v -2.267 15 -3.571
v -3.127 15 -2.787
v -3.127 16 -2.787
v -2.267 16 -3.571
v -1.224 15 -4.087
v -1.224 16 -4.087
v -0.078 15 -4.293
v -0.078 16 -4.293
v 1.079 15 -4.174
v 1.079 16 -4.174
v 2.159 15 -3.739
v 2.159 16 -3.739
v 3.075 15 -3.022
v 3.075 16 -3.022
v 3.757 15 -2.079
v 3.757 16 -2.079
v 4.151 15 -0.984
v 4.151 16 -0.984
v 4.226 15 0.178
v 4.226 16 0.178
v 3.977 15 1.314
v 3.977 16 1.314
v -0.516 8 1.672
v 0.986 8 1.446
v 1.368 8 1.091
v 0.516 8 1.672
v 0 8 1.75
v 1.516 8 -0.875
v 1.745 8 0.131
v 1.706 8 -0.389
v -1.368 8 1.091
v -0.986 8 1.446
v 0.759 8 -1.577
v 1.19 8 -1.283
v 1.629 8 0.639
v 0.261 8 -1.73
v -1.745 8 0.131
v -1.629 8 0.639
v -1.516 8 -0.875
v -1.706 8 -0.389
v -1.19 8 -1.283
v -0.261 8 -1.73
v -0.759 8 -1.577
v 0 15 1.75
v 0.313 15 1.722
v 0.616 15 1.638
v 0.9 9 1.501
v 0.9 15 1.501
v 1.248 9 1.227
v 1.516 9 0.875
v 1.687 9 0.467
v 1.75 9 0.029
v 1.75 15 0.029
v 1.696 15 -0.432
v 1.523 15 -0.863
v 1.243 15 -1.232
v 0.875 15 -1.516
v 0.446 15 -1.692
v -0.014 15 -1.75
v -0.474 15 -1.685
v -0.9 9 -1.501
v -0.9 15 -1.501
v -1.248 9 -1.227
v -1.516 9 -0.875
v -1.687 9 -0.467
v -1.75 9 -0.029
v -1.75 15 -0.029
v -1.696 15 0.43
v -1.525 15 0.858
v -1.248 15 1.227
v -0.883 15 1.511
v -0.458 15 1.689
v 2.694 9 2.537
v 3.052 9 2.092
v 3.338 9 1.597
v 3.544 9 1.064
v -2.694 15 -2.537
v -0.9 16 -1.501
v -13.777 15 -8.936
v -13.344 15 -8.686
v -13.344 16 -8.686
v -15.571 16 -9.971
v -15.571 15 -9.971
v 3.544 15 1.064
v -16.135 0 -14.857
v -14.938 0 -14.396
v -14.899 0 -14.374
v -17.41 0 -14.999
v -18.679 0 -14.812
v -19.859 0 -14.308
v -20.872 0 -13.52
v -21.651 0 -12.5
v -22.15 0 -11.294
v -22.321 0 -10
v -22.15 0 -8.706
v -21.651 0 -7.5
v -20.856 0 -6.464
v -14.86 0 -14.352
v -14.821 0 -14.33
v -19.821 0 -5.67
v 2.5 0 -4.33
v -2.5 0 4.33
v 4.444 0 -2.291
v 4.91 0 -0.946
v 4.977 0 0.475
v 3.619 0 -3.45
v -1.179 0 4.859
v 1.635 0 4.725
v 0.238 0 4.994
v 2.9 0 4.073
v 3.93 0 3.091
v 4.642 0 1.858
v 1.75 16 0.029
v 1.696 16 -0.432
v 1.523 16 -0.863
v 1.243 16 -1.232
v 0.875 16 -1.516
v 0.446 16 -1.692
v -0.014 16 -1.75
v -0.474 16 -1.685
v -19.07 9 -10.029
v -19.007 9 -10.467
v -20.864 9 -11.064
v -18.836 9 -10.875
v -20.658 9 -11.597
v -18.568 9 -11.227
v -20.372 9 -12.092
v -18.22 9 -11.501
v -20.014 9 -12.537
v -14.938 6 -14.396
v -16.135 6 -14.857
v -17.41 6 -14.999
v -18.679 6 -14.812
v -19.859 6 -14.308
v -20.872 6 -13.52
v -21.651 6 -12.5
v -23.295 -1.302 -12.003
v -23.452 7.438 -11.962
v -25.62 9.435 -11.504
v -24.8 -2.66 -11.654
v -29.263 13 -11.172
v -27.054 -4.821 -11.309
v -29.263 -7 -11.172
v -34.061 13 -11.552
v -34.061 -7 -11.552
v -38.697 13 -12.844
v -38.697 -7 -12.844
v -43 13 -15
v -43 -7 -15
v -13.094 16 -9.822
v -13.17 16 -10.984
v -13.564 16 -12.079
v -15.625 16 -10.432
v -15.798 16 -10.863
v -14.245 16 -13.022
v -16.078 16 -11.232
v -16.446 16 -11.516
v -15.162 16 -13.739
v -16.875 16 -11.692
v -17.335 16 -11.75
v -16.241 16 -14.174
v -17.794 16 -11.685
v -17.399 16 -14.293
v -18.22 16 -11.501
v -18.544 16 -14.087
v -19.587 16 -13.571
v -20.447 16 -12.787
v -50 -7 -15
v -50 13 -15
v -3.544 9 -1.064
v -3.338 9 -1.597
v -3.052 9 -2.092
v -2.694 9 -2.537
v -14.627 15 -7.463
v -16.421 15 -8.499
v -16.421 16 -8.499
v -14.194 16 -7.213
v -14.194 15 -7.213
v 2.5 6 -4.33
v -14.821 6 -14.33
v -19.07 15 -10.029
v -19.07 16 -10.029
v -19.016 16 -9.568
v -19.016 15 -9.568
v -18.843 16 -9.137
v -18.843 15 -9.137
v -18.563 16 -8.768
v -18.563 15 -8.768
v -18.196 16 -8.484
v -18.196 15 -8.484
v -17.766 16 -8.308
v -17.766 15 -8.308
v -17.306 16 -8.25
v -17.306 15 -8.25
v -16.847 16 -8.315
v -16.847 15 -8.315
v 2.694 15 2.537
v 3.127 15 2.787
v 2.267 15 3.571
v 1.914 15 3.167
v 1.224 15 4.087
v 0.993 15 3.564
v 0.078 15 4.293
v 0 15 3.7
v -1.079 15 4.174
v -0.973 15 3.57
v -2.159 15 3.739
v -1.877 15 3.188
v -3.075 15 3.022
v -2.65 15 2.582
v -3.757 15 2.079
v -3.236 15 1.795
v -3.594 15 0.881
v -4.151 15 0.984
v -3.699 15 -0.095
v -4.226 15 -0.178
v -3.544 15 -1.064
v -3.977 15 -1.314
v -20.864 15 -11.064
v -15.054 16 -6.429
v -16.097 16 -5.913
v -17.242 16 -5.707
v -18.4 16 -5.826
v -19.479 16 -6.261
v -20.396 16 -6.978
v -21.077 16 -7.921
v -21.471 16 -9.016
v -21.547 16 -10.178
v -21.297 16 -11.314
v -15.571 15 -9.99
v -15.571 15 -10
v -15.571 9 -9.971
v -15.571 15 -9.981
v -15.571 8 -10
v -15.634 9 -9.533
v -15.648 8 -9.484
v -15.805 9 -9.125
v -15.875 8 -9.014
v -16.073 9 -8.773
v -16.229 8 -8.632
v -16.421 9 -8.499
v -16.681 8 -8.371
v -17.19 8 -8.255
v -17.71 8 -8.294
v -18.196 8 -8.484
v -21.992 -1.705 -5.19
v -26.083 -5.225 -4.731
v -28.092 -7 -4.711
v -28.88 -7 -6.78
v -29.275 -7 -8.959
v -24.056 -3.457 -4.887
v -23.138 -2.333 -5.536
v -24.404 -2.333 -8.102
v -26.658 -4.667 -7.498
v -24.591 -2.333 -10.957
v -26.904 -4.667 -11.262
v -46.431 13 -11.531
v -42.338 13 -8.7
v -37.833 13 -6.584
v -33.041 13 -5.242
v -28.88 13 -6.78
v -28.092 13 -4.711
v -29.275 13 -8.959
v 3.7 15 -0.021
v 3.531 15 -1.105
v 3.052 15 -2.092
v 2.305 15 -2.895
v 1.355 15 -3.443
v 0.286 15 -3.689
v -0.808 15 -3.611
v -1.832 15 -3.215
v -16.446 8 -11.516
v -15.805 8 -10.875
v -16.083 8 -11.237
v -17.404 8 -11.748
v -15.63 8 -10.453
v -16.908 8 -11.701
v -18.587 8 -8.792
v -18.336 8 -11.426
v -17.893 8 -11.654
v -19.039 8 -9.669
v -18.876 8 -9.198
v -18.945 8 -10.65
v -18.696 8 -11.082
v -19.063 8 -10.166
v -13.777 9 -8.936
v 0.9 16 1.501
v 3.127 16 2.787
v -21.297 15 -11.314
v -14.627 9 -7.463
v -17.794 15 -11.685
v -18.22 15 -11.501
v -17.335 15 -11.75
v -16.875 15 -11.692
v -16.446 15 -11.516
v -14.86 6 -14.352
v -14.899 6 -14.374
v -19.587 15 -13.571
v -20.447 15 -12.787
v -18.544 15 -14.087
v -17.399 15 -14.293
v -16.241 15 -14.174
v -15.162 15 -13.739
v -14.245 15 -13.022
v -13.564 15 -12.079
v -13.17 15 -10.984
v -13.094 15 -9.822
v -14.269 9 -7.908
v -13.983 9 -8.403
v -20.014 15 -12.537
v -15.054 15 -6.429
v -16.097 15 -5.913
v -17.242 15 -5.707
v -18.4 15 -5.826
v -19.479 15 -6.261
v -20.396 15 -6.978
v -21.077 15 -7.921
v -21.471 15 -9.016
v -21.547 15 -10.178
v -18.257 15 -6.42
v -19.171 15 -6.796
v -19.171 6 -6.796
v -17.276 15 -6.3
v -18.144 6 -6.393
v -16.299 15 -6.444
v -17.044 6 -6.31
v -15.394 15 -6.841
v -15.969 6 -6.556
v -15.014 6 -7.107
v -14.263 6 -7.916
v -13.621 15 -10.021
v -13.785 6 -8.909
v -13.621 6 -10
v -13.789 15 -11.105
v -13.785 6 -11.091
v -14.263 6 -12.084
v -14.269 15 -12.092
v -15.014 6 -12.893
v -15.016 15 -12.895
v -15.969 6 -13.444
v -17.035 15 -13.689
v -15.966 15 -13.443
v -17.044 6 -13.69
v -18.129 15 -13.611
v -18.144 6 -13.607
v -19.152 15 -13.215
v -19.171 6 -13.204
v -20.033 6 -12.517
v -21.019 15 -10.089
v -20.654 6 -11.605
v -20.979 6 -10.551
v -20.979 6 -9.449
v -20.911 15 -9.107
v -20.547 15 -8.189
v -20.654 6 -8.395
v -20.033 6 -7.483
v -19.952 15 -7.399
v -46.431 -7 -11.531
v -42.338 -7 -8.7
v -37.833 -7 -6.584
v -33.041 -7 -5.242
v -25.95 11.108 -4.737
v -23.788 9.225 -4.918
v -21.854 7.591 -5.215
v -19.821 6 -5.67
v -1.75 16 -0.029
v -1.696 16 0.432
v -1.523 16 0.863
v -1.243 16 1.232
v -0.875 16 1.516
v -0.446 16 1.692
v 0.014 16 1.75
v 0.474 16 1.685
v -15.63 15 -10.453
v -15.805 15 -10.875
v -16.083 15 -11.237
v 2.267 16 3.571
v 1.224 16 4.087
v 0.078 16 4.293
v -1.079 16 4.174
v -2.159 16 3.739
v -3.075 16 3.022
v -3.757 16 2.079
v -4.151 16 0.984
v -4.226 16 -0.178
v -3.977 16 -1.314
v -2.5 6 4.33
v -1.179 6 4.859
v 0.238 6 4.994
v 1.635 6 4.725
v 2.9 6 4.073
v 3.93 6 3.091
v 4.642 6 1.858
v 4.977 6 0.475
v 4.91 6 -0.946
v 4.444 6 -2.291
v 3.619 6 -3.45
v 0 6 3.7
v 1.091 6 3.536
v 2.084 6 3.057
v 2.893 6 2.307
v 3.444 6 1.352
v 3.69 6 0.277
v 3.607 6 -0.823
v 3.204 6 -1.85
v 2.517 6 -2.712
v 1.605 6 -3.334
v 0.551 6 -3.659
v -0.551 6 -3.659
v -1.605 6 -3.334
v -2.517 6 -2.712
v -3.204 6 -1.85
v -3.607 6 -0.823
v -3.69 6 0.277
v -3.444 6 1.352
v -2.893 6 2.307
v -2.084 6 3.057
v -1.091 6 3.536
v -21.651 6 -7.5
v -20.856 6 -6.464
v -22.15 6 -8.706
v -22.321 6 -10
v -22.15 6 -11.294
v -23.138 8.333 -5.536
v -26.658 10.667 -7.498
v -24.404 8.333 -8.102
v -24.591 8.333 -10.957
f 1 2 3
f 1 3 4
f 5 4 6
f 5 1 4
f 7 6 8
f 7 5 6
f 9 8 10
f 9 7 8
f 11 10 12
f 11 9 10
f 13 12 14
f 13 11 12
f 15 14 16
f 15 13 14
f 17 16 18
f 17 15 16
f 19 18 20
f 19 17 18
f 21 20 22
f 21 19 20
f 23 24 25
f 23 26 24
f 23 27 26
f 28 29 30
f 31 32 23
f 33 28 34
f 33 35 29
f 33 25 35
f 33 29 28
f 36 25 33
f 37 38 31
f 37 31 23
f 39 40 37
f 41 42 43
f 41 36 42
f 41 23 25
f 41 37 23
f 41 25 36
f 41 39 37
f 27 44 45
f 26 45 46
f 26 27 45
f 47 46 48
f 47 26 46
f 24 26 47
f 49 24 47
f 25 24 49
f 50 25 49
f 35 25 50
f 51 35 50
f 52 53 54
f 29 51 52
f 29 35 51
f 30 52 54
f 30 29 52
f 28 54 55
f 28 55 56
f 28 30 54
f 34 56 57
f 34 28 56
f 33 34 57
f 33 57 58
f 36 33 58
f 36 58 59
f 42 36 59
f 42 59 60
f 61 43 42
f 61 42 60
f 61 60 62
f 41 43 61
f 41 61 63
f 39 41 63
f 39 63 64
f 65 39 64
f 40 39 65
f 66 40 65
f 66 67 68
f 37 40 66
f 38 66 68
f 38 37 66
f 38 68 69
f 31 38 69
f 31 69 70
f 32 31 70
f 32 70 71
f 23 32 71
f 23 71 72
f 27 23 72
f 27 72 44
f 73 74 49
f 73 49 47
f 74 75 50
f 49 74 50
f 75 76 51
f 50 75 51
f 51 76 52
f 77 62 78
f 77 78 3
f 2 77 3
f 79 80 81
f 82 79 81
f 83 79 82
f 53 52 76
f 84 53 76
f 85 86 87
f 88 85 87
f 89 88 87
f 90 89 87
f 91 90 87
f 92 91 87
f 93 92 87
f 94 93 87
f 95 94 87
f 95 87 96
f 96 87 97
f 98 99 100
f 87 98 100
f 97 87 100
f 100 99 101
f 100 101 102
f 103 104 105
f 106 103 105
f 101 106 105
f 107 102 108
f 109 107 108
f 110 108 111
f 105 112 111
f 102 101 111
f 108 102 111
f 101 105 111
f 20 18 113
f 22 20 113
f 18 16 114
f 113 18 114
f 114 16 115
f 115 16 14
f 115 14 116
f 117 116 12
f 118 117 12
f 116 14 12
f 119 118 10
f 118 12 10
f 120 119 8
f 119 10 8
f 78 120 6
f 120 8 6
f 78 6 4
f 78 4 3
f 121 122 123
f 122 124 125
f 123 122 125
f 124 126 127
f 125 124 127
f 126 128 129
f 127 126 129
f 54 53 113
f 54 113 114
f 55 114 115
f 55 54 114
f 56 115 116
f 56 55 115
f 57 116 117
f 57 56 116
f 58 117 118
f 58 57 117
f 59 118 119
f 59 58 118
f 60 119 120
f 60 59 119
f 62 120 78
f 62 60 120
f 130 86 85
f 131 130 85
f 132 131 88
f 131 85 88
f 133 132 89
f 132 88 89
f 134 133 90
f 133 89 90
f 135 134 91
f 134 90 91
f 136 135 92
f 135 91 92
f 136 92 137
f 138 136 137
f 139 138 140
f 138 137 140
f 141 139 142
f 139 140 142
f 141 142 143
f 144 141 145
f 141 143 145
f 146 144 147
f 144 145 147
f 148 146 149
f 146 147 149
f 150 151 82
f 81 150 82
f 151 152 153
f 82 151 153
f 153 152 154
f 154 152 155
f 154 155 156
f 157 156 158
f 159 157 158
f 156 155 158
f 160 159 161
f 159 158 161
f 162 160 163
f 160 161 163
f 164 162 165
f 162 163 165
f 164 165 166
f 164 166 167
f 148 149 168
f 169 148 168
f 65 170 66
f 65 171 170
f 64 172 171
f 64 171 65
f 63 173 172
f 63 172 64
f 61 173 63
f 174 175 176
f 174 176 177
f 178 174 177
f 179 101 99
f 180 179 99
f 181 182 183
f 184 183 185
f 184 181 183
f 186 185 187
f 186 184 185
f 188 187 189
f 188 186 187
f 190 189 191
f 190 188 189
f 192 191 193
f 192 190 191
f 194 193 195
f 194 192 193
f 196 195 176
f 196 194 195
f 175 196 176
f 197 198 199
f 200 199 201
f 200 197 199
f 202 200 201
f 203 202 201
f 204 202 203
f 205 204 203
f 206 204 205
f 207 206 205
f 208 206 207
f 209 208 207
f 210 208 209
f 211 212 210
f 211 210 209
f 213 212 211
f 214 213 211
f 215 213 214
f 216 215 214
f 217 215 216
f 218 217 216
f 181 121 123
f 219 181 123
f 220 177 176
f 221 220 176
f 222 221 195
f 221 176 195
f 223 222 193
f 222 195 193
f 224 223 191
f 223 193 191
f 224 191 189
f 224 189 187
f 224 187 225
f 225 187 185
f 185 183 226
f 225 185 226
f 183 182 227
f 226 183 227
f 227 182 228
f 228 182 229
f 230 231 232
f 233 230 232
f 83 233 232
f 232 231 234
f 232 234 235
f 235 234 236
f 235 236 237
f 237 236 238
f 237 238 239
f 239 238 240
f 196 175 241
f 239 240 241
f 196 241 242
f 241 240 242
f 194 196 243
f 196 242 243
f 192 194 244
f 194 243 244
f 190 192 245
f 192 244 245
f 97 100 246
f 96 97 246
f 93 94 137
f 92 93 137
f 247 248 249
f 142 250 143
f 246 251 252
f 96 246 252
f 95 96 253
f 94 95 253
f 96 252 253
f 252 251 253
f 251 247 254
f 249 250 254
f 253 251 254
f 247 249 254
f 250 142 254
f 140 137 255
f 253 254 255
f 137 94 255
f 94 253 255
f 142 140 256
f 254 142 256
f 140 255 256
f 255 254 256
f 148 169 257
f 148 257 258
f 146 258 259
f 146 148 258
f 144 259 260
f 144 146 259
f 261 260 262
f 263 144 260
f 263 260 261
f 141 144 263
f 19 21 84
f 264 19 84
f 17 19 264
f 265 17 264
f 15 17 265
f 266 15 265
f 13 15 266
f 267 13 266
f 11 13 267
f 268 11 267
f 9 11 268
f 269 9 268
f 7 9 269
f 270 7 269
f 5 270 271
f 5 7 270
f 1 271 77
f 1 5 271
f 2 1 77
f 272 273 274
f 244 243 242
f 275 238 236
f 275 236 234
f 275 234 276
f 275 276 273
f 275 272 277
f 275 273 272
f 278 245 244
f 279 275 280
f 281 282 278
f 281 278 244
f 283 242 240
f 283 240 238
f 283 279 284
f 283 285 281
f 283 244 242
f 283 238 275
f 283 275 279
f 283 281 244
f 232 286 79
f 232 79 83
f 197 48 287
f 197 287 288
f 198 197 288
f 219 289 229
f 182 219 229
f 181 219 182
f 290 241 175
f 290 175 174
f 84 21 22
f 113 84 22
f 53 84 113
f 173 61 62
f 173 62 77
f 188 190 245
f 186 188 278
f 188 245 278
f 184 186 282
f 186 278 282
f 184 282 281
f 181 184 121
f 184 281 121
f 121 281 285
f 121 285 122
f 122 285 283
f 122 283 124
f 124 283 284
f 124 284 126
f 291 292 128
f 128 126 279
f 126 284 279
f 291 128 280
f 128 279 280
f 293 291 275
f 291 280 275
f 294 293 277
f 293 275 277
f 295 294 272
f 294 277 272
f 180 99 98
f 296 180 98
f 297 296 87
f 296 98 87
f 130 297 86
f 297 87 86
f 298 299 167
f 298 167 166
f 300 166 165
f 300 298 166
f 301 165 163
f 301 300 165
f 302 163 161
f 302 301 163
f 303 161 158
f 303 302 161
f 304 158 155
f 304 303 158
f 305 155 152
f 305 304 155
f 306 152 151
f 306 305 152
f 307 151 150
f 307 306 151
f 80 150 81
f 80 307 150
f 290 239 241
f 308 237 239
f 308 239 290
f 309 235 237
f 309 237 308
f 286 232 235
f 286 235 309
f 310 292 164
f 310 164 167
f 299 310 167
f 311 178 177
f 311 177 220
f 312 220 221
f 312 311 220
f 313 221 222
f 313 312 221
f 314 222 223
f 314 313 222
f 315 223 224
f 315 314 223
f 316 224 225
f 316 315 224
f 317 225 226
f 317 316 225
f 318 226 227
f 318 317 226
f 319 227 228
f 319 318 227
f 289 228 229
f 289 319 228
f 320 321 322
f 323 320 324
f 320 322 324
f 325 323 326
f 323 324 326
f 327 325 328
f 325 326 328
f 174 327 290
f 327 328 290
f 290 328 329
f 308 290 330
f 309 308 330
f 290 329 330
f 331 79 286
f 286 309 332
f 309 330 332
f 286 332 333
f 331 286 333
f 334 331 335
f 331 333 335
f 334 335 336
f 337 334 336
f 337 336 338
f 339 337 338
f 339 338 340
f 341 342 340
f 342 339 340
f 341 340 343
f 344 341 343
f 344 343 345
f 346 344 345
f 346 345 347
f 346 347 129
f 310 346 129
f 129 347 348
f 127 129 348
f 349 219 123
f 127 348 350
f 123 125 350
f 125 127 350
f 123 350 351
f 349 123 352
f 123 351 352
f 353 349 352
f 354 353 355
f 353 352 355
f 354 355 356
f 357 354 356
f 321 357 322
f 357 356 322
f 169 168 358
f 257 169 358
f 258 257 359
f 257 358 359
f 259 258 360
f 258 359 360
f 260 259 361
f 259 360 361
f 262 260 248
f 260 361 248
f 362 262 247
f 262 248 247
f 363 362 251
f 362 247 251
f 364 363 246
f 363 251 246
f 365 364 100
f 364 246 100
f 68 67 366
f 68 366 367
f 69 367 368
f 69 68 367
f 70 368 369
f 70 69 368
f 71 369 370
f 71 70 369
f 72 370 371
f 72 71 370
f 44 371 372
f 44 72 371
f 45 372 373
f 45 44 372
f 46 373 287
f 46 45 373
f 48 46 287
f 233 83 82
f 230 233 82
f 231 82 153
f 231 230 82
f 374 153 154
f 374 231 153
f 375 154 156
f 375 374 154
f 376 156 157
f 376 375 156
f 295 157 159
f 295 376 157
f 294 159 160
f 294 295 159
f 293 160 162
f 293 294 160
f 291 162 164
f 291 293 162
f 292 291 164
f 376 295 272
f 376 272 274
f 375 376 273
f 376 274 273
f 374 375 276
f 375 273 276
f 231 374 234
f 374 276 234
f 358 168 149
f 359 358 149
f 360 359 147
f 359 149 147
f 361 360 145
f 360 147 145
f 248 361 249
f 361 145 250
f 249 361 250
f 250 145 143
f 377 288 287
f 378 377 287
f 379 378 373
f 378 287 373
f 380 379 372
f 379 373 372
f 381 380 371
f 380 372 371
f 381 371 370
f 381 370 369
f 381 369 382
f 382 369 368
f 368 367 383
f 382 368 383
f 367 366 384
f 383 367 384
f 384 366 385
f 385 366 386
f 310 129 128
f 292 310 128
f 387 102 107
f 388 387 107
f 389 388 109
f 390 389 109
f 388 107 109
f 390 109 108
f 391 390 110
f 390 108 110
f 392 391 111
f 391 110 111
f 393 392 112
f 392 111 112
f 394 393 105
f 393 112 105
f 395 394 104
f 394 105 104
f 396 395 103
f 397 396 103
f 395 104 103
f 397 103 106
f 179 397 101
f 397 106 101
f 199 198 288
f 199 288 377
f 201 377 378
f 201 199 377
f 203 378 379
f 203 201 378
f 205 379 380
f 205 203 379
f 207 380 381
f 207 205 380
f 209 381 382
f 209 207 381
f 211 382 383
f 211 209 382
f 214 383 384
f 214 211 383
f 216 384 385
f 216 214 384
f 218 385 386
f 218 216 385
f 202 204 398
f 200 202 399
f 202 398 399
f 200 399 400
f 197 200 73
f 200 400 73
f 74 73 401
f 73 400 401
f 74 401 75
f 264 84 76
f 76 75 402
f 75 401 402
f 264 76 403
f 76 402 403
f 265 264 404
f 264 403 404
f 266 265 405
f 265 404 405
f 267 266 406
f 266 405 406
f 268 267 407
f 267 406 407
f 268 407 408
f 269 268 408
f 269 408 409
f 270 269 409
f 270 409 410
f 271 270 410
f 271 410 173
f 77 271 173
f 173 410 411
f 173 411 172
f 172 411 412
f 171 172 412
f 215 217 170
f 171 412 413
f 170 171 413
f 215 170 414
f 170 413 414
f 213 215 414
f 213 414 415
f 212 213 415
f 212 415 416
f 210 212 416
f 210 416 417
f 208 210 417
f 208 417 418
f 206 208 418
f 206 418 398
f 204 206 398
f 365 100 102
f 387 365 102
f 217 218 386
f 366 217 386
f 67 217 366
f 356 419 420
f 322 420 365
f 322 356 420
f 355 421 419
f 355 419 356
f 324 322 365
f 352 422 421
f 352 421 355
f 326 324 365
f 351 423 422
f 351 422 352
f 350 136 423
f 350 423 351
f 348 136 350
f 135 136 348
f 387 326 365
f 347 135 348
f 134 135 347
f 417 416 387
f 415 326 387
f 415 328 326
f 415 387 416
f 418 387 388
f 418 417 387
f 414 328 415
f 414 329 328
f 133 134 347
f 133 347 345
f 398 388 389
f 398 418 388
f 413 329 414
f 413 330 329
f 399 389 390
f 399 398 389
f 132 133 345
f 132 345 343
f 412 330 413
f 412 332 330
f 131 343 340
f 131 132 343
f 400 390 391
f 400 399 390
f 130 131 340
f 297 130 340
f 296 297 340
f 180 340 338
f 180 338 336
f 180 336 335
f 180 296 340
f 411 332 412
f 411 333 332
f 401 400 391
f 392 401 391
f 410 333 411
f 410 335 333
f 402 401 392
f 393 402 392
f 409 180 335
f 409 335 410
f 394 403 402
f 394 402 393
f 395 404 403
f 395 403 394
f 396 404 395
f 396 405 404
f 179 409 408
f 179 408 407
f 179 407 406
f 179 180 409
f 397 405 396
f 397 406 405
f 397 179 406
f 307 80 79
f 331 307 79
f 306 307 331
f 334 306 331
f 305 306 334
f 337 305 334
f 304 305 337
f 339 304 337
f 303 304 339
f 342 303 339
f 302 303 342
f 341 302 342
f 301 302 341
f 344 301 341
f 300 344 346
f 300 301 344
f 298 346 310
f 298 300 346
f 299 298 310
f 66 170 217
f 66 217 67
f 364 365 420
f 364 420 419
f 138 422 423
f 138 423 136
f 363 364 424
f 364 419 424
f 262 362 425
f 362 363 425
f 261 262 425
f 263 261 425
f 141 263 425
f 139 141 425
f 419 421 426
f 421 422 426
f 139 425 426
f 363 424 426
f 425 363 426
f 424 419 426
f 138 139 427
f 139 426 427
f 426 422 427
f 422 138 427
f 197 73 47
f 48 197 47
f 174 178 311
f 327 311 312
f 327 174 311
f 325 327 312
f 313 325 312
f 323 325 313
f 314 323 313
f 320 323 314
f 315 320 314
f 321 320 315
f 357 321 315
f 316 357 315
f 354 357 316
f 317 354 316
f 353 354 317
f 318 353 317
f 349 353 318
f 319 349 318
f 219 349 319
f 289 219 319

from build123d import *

# Parameters (mm, degrees)
BOSS_EXTRUDE1_DEPTH      = 6
BOSS_EXTRUDE2_DEPTH      = 13
BOSS_EXTRUDE2_DEPTH_BACK = 7
SKETCH1_5_R              = 3.7
SKETCH1_5_R_2            = 1.75
BOSS_EXTRUDE3_DEPTH      = 15
CHAMFER2_SIZE            = 7
CUT_EXTRUDE1_START       = -6
CUT_EXTRUDE1_DEPTH       = 6
SKETCH4_R                = 1.75
BOSS_EXTRUDE5_DEPTH      = 2
BOSS_EXTRUDE6_DEPTH      = 1


with BuildPart() as part:
    # Sketch1 → Boss-Extrude1 (new body)
    with BuildSketch(Plane(origin=(0, 0, 0), x_dir=(1, 0, 0), z_dir=(0, 1, 0))):
        with BuildLine():
            Line((-19.820508076, 5.669872981), (-2.5, -4.330127019))
            ThreePointArc((-2.5, -4.330127019), (4.330127019, -2.5), (2.5, 4.330127019))
            Line((2.5, 4.330127019), (-14.820508076, 14.330127019))
            ThreePointArc((-14.820508076, 14.330127019), (-14.879132605, 14.36276697), (-14.937615699, 14.395659668))
            ThreePointArc((-14.937615699, 14.395659668), (-21.683794323, 12.441666055), (-19.820508076, 5.669872981))
        make_face()
    extrude(amount=BOSS_EXTRUDE1_DEPTH)

    # Sketch1<4> → Boss-Extrude2 (add, two sides: drawn at the far end of the back side and taken through both)
    with BuildSketch(Plane(origin=(0, 0, 0), x_dir=(1, 0, 0), z_dir=(0, 1, 0)).offset(-BOSS_EXTRUDE2_DEPTH_BACK)):
        with BuildLine():
            ThreePointArc((-50, 15), (-36.237721473, 6.041072894), (-19.820508076, 5.669872981))
            ThreePointArc((-19.820508076, 5.669872981), (-22.150137207, 8.705904774), (-21.650635095, 12.5))
            ThreePointArc((-21.650635095, 12.5), (-32.607722458, 11.338333803), (-43, 15))
            Line((-43, 15), (-50, 15))
        make_face()
    extrude(amount=BOSS_EXTRUDE2_DEPTH + BOSS_EXTRUDE2_DEPTH_BACK)

    # Sketch1<5> → Boss-Extrude3 (add)
    # profile 1 of 5: a face of its own
    with BuildSketch(Plane(origin=(0, 0, 0), x_dir=(1, 0, 0), z_dir=(0, 1, 0))):
        with Locations(Location((0, 0, 0), (0, 0, 270))):
            Circle(SKETCH1_5_R)
        with Locations(Location((0, 0, 0), (0, 0, 270))):
            Circle(SKETCH1_5_R_2, mode=Mode.SUBTRACT)
    # profile 2 of 5: a face of its own
    with BuildSketch(Plane(origin=(0, 0, 0), x_dir=(1, 0, 0), z_dir=(0, 1, 0))):
        with BuildLine():
            ThreePointArc((-15.470508076, 13.204293994), (-20.52480207, 11.85), (-19.170508076, 6.795706006))
            Line((-19.170508076, 6.795706006), (-18.195508076, 8.484455543))
            ThreePointArc((-18.195508076, 8.484455543), (-18.836052532, 10.875), (-16.445508076, 11.515544457))
            Line((-16.445508076, 11.515544457), (-15.470508076, 13.204293994))
        make_face()
    # profile 3 of 5: a face of its own
    with BuildSketch(Plane(origin=(0, 0, 0), x_dir=(1, 0, 0), z_dir=(0, 1, 0))):
        with BuildLine():
            Line((-18.195508076, 8.484455543), (-19.170508076, 6.795706006))
            ThreePointArc((-19.170508076, 6.795706006), (-15.470508076, 6.795706006), (-13.620508076, 10))
            ThreePointArc((-13.620508076, 10), (-14.116214082, 11.85), (-15.470508076, 13.204293994))
            Line((-15.470508076, 13.204293994), (-16.445508076, 11.515544457))
            ThreePointArc((-16.445508076, 11.515544457), (-15.804963619, 10.875), (-15.570508076, 10))
            ThreePointArc((-15.570508076, 10), (-16.445508076, 8.484455543), (-18.195508076, 8.484455543))
        make_face()
    # profile 4 of 5: a face of its own
    with BuildSketch(Plane(origin=(0, 0, 0), x_dir=(1, 0, 0), z_dir=(0, 1, 0))):
        with BuildLine():
            ThreePointArc((-15.470508076, 13.204293994), (-20.52480207, 11.85), (-19.170508076, 6.795706006))
            Line((-19.170508076, 6.795706006), (-18.195508076, 8.484455543))
            ThreePointArc((-18.195508076, 8.484455543), (-18.836052532, 10.875), (-16.445508076, 11.515544457))
            Line((-16.445508076, 11.515544457), (-15.470508076, 13.204293994))
        make_face()
    # profile 5 of 5: a face of its own
    with BuildSketch(Plane(origin=(0, 0, 0), x_dir=(1, 0, 0), z_dir=(0, 1, 0))):
        with BuildLine():
            Line((-18.195508076, 8.484455543), (-19.170508076, 6.795706006))
            ThreePointArc((-19.170508076, 6.795706006), (-15.470508076, 6.795706006), (-13.620508076, 10))
            ThreePointArc((-13.620508076, 10), (-14.116214082, 11.85), (-15.470508076, 13.204293994))
            Line((-15.470508076, 13.204293994), (-16.445508076, 11.515544457))
            ThreePointArc((-16.445508076, 11.515544457), (-15.804963619, 10.875), (-15.570508076, 10))
            ThreePointArc((-15.570508076, 10), (-16.445508076, 8.484455543), (-18.195508076, 8.484455543))
        make_face()
    extrude(amount=BOSS_EXTRUDE3_DEPTH)

    # Chamfer2
    chamfer2_edges = [part.edges().sort_by_distance(p)[0] for p in [
        (-22.150137207, -7, -8.705904774),
        (-22.150137207, 13, -8.705904774),
    ]]
    chamfer(chamfer2_edges, length=CHAMFER2_SIZE - 0.0001)  # a hair under: the kernel refuses the full size

    # Sketch3 → Cut-Extrude1 (cut)
    with BuildSketch(Plane(origin=(0, 15, 0), x_dir=(1, 0, 0), z_dir=(0, 1, 0)).offset(CUT_EXTRUDE1_START)):
        with BuildLine():
            Line((-20.014101509, 12.536642351), (-18.220272206, 11.50097452))
            ThreePointArc((-18.220272206, 11.50097452), (-18.836052532, 10.875), (-19.070272206, 10.028731334))
            Line((-19.070272206, 10.028731334), (-20.864101509, 11.064399165))
            ThreePointArc((-20.864101509, 11.064399165), (-20.52480207, 11.85), (-20.014101509, 12.536642351))
        make_face()
        with BuildLine():
            Line((-13.776914643, 8.935600835), (-15.570743946, 9.971268666))
            ThreePointArc((-15.570743946, 9.971268666), (-15.804963619, 9.125), (-16.420743946, 8.49902548))
            Line((-16.420743946, 8.49902548), (-14.626914643, 7.463357649))
            ThreePointArc((-14.626914643, 7.463357649), (-14.116214082, 8.15), (-13.776914643, 8.935600835))
        make_face()
        with BuildLine():
            Line((2.693593433, -2.536642351), (0.89976413, -1.50097452))
            ThreePointArc((0.89976413, -1.50097452), (1.515544457, -0.875), (1.74976413, -0.028731334))
            Line((1.74976413, -0.028731334), (3.543593433, -1.064399165))
            ThreePointArc((3.543593433, -1.064399165), (3.204293994, -1.85), (2.693593433, -2.536642351))
        make_face()
        with BuildLine():
            Line((-3.543593433, 1.064399165), (-1.74976413, 0.028731334))
            ThreePointArc((-1.74976413, 0.028731334), (-1.515544457, 0.875), (-0.89976413, 1.50097452))
            Line((-0.89976413, 1.50097452), (-2.693593433, 2.536642351))
            ThreePointArc((-2.693593433, 2.536642351), (-3.204293994, 1.85), (-3.543593433, 1.064399165))
        make_face()
    extrude(amount=CUT_EXTRUDE1_DEPTH, mode=Mode.SUBTRACT)

    # Sketch4 → Boss-Extrude5 (add)
    with BuildSketch(Plane(origin=(0, 6, 0), x_dir=(1, 0, 0), z_dir=(0, 1, 0))):
        with Locations(Location((-17.320508076, 10, 0), (0, 0, 120.940718932))):
            Circle(SKETCH4_R)
        with Locations(Location((0, 0, 0), (0, 0, 90))):
            Circle(SKETCH4_R)
    extrude(amount=BOSS_EXTRUDE5_DEPTH)

    # Sketch6 → Boss-Extrude6 (add)
    with BuildSketch(Plane(origin=(0, 15, 0), x_dir=(1, 0, 0), z_dir=(0, 1, 0))):
        with BuildLine():
            Line((-18.220272206, 11.50097452), (-20.447114211, 12.786642351))
            ThreePointArc((-20.447114211, 12.786642351), (-15.161973233, 13.738692017), (-13.343901941, 8.685600835))
            Line((-13.343901941, 8.685600835), (-15.570743946, 9.971268666))
            ThreePointArc((-15.570743946, 9.971268666), (-16.445508076, 11.515544457), (-18.220272206, 11.50097452))
        make_face()
        with BuildLine():
            Line((-16.420743946, 8.49902548), (-14.193901941, 7.213357649))
            ThreePointArc((-14.193901941, 7.213357649), (-19.479042918, 6.261307983), (-21.297114211, 11.314399165))
            Line((-21.297114211, 11.314399165), (-19.070272206, 10.028731334))
            ThreePointArc((-19.070272206, 10.028731334), (-18.195508076, 8.484455543), (-16.420743946, 8.49902548))
        make_face()
        with BuildLine():
            Line((0.89976413, -1.50097452), (3.126606135, -2.786642351))
            ThreePointArc((3.126606135, -2.786642351), (-2.158534843, -3.738692017), (-3.976606135, 1.314399165))
            Line((-3.976606135, 1.314399165), (-1.74976413, 0.028731334))
            ThreePointArc((-1.74976413, 0.028731334), (-0.875, -1.515544457), (0.89976413, -1.50097452))
        make_face()
        with BuildLine():
            Line((-0.89976413, 1.50097452), (-3.126606135, 2.786642351))
            ThreePointArc((-3.126606135, 2.786642351), (2.158534843, 3.738692017), (3.976606135, -1.314399165))
            Line((3.976606135, -1.314399165), (1.74976413, -0.028731334))
            ThreePointArc((1.74976413, -0.028731334), (0.875, 1.515544457), (-0.89976413, 1.50097452))
        make_face()
    extrude(amount=BOSS_EXTRUDE6_DEPTH)


solid = part.part
